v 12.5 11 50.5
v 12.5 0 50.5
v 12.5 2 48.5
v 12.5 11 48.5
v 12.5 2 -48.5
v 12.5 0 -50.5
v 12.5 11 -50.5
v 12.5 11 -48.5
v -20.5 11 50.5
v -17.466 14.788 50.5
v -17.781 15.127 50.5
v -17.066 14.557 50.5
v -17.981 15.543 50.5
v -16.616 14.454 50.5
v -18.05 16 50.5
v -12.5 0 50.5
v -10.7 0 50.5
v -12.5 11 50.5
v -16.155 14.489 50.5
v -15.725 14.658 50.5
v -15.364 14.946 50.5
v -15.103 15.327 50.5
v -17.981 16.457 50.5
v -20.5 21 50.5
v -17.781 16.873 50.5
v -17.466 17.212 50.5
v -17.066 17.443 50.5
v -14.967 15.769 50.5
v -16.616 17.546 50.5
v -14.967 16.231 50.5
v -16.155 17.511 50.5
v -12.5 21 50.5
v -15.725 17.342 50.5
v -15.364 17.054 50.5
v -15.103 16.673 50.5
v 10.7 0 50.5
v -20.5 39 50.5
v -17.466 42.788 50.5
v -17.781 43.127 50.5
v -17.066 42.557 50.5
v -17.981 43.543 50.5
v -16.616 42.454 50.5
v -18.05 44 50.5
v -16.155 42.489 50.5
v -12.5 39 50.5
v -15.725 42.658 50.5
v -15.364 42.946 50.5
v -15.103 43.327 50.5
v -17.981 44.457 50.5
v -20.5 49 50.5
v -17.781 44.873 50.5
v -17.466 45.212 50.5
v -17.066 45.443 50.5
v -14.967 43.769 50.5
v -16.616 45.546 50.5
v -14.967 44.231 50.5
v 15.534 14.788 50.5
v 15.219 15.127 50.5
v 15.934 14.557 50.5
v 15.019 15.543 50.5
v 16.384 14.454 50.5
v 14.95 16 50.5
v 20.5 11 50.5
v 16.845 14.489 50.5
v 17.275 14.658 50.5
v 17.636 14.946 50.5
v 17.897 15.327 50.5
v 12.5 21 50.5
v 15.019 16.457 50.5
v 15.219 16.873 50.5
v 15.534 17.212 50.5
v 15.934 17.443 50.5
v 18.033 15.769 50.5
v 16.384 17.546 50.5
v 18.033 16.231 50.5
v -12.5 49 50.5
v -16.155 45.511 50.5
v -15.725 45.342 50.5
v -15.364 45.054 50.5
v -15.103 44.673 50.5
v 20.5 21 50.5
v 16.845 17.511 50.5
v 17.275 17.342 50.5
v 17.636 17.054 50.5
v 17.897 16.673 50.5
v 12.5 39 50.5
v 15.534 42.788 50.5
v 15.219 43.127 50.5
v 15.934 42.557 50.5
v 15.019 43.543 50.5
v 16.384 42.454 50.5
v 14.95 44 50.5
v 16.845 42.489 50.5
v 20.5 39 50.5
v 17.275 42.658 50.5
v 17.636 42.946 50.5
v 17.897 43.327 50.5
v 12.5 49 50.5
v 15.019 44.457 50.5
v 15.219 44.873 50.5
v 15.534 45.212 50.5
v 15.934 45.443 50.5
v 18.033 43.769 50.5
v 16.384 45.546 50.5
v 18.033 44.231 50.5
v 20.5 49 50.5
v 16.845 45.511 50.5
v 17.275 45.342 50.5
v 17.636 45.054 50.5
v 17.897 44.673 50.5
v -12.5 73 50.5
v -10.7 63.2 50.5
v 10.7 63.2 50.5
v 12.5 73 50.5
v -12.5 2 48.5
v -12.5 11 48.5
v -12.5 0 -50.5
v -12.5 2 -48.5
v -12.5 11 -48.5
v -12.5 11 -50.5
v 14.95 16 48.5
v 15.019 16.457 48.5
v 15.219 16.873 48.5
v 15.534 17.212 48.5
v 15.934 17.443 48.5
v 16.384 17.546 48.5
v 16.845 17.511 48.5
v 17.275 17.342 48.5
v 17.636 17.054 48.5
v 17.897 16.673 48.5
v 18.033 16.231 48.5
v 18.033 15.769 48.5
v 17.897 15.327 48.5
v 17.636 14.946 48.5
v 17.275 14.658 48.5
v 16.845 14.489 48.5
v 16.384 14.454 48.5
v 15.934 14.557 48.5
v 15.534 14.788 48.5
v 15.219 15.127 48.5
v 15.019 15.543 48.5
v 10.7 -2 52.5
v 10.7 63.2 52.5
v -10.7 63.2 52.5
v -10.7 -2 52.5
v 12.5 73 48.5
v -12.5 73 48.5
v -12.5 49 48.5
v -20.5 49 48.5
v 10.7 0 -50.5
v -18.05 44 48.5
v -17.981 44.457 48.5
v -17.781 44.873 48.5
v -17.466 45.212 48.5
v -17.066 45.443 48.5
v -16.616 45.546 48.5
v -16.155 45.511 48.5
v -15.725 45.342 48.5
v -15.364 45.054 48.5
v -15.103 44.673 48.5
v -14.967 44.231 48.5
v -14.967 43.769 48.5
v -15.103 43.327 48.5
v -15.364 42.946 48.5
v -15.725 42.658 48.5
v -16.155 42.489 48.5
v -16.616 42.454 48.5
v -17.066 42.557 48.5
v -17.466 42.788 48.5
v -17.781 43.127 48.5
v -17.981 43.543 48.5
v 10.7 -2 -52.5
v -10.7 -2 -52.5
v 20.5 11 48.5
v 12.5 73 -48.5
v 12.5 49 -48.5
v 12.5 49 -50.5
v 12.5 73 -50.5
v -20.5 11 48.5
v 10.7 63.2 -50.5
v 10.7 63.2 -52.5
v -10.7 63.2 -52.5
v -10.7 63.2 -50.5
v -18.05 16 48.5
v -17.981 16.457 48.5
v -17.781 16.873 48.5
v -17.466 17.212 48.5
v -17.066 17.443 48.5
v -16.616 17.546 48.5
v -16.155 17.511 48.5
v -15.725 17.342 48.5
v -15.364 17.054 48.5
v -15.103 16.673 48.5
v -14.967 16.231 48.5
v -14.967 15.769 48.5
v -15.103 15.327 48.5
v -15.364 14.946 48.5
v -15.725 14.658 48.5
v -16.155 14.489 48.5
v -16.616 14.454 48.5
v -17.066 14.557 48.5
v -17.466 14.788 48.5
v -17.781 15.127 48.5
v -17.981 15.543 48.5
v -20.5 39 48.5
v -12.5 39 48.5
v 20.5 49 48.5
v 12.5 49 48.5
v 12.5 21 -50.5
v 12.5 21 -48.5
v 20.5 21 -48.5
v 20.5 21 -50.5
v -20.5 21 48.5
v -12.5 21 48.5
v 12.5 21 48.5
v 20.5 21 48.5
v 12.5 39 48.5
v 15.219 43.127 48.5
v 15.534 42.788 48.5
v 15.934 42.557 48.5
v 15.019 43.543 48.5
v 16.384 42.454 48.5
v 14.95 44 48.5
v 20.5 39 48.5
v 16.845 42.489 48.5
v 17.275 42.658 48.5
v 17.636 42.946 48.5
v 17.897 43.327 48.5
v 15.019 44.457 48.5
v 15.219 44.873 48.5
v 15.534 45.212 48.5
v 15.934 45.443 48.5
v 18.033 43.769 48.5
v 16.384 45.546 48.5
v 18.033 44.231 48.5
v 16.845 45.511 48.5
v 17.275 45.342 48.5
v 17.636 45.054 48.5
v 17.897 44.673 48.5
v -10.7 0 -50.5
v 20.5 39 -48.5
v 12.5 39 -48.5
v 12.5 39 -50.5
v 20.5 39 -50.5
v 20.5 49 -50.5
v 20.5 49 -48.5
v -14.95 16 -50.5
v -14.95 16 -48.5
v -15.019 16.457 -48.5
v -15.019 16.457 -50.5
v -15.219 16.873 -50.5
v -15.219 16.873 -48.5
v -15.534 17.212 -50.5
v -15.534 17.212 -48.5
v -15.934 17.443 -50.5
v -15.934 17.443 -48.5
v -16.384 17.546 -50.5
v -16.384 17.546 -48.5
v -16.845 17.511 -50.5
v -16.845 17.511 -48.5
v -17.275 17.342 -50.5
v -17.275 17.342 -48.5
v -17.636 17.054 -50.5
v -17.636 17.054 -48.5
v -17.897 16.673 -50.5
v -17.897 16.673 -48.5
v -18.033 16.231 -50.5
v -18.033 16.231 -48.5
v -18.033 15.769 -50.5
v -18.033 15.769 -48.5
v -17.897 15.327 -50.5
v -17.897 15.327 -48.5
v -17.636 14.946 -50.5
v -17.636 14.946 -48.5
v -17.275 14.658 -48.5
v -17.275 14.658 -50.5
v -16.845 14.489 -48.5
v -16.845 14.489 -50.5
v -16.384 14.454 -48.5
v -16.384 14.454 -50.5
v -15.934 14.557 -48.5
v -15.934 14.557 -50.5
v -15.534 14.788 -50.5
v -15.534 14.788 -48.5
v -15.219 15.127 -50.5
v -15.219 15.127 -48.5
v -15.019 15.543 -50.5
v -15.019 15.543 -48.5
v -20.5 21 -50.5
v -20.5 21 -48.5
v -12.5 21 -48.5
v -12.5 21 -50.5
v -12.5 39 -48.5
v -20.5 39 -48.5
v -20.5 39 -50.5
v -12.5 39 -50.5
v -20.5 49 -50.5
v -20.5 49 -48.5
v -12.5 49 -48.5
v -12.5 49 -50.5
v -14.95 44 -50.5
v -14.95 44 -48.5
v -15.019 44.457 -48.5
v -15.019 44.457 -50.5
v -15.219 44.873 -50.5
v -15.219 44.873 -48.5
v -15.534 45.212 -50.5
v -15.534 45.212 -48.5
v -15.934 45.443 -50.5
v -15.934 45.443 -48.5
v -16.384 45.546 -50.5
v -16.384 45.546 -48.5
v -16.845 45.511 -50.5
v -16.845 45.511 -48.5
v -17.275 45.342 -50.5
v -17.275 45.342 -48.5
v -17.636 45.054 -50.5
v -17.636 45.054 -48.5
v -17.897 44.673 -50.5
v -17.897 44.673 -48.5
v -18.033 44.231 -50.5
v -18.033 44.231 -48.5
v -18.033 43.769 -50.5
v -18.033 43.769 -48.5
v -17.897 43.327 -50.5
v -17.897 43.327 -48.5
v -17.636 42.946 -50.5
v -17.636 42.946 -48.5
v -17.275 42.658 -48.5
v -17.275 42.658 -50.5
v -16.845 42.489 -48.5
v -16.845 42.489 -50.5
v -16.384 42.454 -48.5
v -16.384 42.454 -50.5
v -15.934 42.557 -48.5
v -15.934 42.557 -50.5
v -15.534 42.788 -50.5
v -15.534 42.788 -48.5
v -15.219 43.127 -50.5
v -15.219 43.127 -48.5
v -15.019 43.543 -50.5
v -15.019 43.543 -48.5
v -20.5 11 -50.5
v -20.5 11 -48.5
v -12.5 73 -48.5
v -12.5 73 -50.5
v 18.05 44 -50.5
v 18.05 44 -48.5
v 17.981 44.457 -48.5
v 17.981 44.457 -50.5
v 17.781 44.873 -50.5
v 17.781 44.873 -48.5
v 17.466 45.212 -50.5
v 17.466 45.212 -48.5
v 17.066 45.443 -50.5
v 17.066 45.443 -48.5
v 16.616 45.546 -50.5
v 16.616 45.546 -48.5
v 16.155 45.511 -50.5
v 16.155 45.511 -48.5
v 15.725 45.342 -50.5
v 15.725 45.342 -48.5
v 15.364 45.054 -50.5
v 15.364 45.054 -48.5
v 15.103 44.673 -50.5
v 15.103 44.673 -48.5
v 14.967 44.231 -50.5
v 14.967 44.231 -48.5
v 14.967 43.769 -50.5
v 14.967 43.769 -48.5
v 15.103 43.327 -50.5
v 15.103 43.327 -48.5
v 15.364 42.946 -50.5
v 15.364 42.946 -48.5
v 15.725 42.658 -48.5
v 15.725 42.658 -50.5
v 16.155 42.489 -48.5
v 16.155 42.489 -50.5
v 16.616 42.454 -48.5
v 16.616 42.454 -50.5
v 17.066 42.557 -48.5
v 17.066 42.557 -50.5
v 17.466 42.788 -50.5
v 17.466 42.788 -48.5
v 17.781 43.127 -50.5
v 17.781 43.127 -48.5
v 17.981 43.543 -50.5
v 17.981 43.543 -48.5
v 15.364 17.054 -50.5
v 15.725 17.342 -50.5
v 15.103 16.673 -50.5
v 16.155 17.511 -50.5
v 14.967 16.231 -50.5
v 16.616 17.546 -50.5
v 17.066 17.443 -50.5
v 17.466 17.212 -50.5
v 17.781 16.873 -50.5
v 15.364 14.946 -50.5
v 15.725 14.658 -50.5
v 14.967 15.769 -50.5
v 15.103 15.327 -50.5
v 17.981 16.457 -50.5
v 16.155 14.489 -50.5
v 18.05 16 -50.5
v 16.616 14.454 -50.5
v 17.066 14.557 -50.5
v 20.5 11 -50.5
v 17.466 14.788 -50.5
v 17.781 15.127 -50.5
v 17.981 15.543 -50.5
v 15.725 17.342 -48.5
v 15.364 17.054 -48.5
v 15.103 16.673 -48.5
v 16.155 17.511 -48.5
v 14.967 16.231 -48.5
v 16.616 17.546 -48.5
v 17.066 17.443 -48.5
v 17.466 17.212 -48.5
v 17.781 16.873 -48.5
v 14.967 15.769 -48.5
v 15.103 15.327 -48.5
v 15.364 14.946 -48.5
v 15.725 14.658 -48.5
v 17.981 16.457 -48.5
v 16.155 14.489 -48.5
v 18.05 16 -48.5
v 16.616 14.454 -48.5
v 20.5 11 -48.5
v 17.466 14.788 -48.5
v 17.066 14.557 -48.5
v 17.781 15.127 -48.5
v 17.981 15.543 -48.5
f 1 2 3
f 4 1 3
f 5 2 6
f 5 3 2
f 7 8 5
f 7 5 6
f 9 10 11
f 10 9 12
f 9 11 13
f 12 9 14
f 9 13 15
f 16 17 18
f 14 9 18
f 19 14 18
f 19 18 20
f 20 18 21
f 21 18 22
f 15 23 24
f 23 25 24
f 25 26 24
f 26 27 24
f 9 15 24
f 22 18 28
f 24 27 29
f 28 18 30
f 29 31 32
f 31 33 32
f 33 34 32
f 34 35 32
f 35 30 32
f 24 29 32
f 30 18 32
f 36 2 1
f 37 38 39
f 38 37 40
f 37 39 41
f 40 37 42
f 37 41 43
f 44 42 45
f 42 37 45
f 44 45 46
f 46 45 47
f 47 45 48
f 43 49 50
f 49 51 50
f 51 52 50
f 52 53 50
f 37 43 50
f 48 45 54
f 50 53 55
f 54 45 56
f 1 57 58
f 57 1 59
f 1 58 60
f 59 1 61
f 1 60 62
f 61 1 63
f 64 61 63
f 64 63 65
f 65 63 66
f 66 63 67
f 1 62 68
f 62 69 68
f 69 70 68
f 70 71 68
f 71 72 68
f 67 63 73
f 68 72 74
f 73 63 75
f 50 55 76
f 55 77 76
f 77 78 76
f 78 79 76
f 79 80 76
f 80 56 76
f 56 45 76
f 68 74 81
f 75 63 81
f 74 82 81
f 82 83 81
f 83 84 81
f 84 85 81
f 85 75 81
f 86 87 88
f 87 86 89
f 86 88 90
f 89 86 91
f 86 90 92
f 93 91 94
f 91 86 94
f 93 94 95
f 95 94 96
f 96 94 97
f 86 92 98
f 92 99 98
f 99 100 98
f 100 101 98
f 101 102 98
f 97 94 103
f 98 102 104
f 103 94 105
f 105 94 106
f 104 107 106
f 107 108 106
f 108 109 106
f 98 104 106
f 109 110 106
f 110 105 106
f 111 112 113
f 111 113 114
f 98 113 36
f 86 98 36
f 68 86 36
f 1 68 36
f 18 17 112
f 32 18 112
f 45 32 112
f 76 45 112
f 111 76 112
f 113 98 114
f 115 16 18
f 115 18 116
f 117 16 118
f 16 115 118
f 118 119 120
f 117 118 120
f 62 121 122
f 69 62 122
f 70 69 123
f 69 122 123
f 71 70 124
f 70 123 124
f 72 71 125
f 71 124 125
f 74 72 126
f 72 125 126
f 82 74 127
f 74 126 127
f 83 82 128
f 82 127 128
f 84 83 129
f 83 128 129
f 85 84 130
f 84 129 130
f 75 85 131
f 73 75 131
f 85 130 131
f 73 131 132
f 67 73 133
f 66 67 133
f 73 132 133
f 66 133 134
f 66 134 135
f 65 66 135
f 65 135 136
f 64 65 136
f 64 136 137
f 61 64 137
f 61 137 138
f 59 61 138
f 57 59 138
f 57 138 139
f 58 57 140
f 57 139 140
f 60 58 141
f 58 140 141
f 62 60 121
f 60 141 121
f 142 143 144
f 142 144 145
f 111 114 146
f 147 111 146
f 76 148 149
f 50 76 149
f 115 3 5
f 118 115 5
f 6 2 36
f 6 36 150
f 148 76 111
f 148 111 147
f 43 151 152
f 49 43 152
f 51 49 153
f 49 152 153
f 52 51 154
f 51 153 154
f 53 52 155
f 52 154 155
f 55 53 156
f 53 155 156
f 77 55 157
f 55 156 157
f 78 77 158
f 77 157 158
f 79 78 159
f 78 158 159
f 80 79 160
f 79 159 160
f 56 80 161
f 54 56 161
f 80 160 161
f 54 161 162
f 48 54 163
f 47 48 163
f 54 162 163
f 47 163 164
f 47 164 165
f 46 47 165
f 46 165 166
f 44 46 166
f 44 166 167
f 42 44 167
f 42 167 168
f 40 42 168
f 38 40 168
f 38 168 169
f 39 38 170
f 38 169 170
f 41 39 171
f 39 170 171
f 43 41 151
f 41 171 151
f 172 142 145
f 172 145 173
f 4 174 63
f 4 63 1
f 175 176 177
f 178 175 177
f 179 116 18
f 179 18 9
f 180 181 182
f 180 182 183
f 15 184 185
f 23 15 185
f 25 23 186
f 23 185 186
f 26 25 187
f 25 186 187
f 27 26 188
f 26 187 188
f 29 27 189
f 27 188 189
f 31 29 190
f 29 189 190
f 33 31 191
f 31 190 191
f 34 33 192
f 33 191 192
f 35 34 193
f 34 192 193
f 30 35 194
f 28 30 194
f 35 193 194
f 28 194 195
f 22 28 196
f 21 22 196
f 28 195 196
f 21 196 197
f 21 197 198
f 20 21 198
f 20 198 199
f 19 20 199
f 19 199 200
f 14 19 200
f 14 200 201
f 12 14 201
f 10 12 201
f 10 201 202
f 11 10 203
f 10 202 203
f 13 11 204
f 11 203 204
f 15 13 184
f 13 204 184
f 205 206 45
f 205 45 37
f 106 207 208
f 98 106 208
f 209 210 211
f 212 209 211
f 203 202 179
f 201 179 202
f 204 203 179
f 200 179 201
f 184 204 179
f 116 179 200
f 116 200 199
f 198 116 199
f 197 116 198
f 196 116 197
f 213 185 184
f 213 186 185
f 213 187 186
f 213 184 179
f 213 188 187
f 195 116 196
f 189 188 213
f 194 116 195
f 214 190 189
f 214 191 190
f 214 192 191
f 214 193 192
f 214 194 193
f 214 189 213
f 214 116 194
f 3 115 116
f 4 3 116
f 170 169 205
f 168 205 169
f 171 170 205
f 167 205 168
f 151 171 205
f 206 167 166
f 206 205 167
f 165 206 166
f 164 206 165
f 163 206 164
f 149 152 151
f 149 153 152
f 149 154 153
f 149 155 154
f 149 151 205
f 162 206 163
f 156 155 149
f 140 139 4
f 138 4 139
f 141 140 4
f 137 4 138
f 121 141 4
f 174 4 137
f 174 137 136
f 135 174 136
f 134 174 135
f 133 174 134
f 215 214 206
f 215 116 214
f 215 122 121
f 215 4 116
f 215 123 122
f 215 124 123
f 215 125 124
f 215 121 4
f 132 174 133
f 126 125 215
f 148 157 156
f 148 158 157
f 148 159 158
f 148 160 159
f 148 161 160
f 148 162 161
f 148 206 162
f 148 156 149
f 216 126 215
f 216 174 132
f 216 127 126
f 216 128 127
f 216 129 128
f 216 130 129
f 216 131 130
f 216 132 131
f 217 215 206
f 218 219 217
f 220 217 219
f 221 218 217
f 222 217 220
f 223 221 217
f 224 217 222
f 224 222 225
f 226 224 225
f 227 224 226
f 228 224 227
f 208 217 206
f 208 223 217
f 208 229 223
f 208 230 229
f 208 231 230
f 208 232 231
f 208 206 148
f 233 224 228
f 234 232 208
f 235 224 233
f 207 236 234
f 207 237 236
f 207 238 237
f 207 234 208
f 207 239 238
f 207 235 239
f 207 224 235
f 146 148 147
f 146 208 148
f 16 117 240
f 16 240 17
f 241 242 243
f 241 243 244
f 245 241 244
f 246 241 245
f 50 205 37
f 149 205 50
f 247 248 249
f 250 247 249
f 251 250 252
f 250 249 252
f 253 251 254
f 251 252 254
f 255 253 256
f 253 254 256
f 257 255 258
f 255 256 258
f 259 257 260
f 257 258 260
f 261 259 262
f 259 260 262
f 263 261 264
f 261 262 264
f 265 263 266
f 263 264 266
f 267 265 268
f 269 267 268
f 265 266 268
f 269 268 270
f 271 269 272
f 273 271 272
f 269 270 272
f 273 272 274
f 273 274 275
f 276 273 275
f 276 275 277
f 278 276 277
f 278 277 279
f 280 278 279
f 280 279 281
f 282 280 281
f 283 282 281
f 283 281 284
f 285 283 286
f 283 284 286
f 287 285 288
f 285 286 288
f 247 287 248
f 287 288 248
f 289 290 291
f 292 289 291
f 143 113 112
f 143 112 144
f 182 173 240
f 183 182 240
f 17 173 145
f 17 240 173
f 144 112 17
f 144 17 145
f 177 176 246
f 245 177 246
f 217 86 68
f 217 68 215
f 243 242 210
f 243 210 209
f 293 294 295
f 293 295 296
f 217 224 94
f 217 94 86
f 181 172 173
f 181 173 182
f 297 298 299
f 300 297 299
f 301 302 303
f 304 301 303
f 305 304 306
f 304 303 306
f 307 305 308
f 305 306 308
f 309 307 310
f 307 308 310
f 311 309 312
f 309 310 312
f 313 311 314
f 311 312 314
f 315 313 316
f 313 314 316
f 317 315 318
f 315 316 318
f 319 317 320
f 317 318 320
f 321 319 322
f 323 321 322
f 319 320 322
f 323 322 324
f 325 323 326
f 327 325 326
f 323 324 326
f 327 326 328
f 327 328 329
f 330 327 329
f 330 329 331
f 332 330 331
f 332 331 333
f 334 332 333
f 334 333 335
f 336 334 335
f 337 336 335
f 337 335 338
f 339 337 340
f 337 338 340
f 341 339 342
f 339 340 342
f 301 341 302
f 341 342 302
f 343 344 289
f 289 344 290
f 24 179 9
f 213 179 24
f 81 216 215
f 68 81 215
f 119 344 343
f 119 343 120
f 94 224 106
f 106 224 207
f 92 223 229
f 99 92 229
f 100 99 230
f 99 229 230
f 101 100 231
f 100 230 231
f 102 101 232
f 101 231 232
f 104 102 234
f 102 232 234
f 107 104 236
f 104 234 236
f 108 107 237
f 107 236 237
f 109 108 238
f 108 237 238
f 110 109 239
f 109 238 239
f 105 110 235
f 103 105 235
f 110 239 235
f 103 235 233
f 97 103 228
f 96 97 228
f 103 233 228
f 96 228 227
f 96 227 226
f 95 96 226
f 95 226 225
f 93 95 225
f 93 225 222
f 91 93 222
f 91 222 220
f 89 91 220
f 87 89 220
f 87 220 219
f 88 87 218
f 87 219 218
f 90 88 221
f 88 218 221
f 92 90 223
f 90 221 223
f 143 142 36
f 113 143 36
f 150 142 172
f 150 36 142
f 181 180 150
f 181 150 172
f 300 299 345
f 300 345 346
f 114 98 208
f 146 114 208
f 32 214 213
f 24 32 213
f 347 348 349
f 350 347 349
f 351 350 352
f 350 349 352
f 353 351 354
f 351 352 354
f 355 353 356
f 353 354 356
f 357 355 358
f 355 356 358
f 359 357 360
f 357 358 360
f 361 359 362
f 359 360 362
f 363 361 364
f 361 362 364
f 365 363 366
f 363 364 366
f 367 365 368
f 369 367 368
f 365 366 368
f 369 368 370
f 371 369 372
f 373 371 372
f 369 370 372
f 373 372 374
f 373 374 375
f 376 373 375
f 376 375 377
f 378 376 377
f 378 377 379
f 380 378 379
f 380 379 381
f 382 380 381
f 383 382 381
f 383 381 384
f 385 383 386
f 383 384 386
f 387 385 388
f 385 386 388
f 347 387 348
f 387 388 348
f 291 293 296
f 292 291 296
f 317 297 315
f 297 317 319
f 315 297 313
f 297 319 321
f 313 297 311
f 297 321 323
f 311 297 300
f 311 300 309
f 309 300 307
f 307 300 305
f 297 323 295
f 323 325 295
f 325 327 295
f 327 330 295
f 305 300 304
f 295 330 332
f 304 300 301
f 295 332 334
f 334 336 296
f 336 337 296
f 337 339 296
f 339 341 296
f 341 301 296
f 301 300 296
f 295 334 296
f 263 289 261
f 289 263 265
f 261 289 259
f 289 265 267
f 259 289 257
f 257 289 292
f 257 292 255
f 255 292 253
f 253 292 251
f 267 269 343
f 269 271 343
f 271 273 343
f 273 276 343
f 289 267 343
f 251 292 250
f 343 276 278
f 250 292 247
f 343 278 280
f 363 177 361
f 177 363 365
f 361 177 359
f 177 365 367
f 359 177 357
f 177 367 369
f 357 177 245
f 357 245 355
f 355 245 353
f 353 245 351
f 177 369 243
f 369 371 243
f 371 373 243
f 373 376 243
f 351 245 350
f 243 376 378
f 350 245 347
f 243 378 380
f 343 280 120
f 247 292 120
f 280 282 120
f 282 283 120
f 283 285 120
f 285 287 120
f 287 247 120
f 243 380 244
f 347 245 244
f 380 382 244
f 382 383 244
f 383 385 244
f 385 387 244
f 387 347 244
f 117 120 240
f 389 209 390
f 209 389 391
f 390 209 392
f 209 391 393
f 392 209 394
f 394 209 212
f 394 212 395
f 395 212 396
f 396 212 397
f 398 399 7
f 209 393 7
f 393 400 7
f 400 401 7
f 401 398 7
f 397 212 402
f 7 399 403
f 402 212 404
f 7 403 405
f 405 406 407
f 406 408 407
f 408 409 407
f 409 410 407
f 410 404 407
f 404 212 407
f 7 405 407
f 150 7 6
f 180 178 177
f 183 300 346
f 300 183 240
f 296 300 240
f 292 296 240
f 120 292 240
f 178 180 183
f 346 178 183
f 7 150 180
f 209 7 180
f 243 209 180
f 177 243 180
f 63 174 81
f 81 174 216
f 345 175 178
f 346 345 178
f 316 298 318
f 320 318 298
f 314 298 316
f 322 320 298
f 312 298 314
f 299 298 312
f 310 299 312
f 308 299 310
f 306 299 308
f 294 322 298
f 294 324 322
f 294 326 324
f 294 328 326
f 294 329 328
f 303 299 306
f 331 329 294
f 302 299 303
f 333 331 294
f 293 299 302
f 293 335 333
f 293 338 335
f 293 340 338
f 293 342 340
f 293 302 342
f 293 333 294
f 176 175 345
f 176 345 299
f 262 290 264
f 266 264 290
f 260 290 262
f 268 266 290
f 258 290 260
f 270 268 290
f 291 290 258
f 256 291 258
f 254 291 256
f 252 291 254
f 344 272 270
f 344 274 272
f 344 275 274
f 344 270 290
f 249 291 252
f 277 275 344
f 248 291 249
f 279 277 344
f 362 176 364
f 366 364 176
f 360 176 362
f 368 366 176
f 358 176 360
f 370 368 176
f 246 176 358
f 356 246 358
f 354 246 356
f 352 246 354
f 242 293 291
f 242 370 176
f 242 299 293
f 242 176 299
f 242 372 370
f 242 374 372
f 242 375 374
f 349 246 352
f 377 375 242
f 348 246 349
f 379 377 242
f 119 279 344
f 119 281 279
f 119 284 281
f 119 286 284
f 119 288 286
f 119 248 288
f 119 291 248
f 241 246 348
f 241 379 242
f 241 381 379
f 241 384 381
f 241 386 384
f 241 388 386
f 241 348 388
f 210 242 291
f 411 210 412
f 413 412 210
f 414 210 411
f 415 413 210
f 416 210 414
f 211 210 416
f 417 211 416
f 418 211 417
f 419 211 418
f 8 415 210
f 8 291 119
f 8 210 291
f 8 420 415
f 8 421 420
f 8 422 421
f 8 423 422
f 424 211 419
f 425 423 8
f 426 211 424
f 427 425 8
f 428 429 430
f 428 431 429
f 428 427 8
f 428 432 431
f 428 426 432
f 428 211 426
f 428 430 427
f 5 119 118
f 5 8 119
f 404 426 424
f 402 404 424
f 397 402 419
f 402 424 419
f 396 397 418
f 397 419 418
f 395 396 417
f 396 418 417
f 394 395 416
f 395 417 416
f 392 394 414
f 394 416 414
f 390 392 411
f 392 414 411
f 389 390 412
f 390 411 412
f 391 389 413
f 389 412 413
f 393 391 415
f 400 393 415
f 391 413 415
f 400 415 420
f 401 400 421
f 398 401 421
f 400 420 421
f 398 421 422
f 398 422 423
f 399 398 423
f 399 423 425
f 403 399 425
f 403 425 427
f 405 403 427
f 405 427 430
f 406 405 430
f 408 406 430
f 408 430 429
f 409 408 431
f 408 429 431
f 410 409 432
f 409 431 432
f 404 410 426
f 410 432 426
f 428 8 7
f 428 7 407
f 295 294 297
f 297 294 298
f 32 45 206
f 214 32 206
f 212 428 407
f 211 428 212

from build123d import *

# Parameters (mm, degrees)
SKETCH1_W           = 105
SKETCH1_H           = 4
SKETCH1_W_2         = 2
SKETCH1_H_2         = 9.8
BOSS_EXTRUDE1_DEPTH = 12.5
SKETCH2_W           = 8
SKETCH2_H           = 10
SKETCH2_R           = 1.55
BOSS_EXTRUDE2_DEPTH = 2
SKETCH4_W           = 8
SKETCH4_H           = 10
SKETCH4_R           = 1.55
BOSS_EXTRUDE3_DEPTH = 2
SKETCH5_W           = 101
SKETCH5_H           = 2
CUT_EXTRUDE1_DEPTH  = 1.8
SKETCH6_W           = 101
SKETCH6_H           = 2
CUT_EXTRUDE2_DEPTH  = 1.8


with BuildPart() as part:
    # Sketch1 → Boss-Extrude1 (new body, symmetric)
    with BuildSketch(Plane(origin=(0, 0, 0), x_dir=(0, 0, -1), z_dir=(1, 0, 0))):
        Rectangle(SKETCH1_W, SKETCH1_H)
        Polygon((-52.5, 63.2), (-52.5, 2), (-48.5, 2), (-48.5, 63.2), (-50.5, 63.2), align=None)
        Polygon((48.5, 63.2), (48.5, 2), (52.5, 2), (52.5, 63.2), (50.5, 63.2), align=None)
        with Locations((-49.5, 68.1)):
            Rectangle(SKETCH1_W_2, SKETCH1_H_2)
        with Locations((49.5, 68.1)):
            Rectangle(SKETCH1_W_2, SKETCH1_H_2)
    extrude(amount=BOSS_EXTRUDE1_DEPTH, both=True)

    # Sketch2 → Boss-Extrude2 (add)
    with BuildSketch(Plane.XY.offset(-48.5)):
        with Locations((-16.5, 16)):
            Rectangle(SKETCH2_W, SKETCH2_H)
        with Locations((-16.5, 16)):
            Circle(SKETCH2_R, mode=Mode.SUBTRACT)
        with Locations((-16.5, 44)):
            Rectangle(SKETCH2_W, SKETCH2_H)
        with Locations((-16.5, 44)):
            Circle(SKETCH2_R, mode=Mode.SUBTRACT)
        with Locations((16.5, 16)):
            Rectangle(SKETCH2_W, SKETCH2_H)
        with Locations((16.5, 16)):
            Circle(SKETCH2_R, mode=Mode.SUBTRACT)
        with Locations((16.5, 44)):
            Rectangle(SKETCH2_W, SKETCH2_H)
        with Locations((16.5, 44)):
            Circle(SKETCH2_R, mode=Mode.SUBTRACT)
    extrude(amount=-BOSS_EXTRUDE2_DEPTH)

    # Sketch4 → Boss-Extrude3 (add)
    with BuildSketch(Plane(origin=(0, 0, 48.5), x_dir=(-1, 0, 0), z_dir=(0, 0, -1))):
        with Locations((-16.5, 16)):
            Rectangle(SKETCH4_W, SKETCH4_H)
        with Locations((-16.5, 16)):
            Circle(SKETCH4_R, mode=Mode.SUBTRACT)
        with Locations((-16.5, 44)):
            Rectangle(SKETCH4_W, SKETCH4_H)
        with Locations((-16.5, 44)):
            Circle(SKETCH4_R, mode=Mode.SUBTRACT)
        with Locations((16.5, 16)):
            Rectangle(SKETCH4_W, SKETCH4_H)
        with Locations((16.5, 16)):
            Circle(SKETCH4_R, mode=Mode.SUBTRACT)
        with Locations((16.5, 44)):
            Rectangle(SKETCH4_W, SKETCH4_H)
        with Locations((16.5, 44)):
            Circle(SKETCH4_R, mode=Mode.SUBTRACT)
    extrude(amount=-BOSS_EXTRUDE3_DEPTH)

    # Sketch5 → Cut-Extrude1 (cut)
    with BuildSketch(Plane.ZY.offset(12.5)):
        Polygon((-50.5, 63.2), (-52.5, 63.2), (-52.5, -2), (-50.5, -2), (-50.5, 0), (-50.5, 11), (-50.5, 21), (-50.5, 39), (-50.5, 49), align=None)
        with Locations((0, -1)):
            Rectangle(SKETCH5_W, SKETCH5_H)
        Polygon((50.5, 0), (50.5, -2), (52.5, -2), (52.5, 63.2), (50.5, 63.2), (50.5, 49), (50.5, 39), (50.5, 21), (50.5, 11), align=None)
    extrude(amount=-CUT_EXTRUDE1_DEPTH, mode=Mode.SUBTRACT)

    # Sketch6 → Cut-Extrude2 (cut)
    with BuildSketch(Plane(origin=(12.5, 0, 0), x_dir=(0, 0, -1), z_dir=(1, 0, 0))):
        Polygon((-50.5, 0), (-50.5, 63.2), (-52.5, 63.2), (-52.5, -2), (-50.5, -2), align=None)
        with Locations((0, -1)):
            Rectangle(SKETCH6_W, SKETCH6_H)
        Polygon((50.5, 63.2), (50.5, 0), (50.5, -2), (52.5, -2), (52.5, 63.2), align=None)
    extrude(amount=-CUT_EXTRUDE2_DEPTH, mode=Mode.SUBTRACT)


solid = part.part
